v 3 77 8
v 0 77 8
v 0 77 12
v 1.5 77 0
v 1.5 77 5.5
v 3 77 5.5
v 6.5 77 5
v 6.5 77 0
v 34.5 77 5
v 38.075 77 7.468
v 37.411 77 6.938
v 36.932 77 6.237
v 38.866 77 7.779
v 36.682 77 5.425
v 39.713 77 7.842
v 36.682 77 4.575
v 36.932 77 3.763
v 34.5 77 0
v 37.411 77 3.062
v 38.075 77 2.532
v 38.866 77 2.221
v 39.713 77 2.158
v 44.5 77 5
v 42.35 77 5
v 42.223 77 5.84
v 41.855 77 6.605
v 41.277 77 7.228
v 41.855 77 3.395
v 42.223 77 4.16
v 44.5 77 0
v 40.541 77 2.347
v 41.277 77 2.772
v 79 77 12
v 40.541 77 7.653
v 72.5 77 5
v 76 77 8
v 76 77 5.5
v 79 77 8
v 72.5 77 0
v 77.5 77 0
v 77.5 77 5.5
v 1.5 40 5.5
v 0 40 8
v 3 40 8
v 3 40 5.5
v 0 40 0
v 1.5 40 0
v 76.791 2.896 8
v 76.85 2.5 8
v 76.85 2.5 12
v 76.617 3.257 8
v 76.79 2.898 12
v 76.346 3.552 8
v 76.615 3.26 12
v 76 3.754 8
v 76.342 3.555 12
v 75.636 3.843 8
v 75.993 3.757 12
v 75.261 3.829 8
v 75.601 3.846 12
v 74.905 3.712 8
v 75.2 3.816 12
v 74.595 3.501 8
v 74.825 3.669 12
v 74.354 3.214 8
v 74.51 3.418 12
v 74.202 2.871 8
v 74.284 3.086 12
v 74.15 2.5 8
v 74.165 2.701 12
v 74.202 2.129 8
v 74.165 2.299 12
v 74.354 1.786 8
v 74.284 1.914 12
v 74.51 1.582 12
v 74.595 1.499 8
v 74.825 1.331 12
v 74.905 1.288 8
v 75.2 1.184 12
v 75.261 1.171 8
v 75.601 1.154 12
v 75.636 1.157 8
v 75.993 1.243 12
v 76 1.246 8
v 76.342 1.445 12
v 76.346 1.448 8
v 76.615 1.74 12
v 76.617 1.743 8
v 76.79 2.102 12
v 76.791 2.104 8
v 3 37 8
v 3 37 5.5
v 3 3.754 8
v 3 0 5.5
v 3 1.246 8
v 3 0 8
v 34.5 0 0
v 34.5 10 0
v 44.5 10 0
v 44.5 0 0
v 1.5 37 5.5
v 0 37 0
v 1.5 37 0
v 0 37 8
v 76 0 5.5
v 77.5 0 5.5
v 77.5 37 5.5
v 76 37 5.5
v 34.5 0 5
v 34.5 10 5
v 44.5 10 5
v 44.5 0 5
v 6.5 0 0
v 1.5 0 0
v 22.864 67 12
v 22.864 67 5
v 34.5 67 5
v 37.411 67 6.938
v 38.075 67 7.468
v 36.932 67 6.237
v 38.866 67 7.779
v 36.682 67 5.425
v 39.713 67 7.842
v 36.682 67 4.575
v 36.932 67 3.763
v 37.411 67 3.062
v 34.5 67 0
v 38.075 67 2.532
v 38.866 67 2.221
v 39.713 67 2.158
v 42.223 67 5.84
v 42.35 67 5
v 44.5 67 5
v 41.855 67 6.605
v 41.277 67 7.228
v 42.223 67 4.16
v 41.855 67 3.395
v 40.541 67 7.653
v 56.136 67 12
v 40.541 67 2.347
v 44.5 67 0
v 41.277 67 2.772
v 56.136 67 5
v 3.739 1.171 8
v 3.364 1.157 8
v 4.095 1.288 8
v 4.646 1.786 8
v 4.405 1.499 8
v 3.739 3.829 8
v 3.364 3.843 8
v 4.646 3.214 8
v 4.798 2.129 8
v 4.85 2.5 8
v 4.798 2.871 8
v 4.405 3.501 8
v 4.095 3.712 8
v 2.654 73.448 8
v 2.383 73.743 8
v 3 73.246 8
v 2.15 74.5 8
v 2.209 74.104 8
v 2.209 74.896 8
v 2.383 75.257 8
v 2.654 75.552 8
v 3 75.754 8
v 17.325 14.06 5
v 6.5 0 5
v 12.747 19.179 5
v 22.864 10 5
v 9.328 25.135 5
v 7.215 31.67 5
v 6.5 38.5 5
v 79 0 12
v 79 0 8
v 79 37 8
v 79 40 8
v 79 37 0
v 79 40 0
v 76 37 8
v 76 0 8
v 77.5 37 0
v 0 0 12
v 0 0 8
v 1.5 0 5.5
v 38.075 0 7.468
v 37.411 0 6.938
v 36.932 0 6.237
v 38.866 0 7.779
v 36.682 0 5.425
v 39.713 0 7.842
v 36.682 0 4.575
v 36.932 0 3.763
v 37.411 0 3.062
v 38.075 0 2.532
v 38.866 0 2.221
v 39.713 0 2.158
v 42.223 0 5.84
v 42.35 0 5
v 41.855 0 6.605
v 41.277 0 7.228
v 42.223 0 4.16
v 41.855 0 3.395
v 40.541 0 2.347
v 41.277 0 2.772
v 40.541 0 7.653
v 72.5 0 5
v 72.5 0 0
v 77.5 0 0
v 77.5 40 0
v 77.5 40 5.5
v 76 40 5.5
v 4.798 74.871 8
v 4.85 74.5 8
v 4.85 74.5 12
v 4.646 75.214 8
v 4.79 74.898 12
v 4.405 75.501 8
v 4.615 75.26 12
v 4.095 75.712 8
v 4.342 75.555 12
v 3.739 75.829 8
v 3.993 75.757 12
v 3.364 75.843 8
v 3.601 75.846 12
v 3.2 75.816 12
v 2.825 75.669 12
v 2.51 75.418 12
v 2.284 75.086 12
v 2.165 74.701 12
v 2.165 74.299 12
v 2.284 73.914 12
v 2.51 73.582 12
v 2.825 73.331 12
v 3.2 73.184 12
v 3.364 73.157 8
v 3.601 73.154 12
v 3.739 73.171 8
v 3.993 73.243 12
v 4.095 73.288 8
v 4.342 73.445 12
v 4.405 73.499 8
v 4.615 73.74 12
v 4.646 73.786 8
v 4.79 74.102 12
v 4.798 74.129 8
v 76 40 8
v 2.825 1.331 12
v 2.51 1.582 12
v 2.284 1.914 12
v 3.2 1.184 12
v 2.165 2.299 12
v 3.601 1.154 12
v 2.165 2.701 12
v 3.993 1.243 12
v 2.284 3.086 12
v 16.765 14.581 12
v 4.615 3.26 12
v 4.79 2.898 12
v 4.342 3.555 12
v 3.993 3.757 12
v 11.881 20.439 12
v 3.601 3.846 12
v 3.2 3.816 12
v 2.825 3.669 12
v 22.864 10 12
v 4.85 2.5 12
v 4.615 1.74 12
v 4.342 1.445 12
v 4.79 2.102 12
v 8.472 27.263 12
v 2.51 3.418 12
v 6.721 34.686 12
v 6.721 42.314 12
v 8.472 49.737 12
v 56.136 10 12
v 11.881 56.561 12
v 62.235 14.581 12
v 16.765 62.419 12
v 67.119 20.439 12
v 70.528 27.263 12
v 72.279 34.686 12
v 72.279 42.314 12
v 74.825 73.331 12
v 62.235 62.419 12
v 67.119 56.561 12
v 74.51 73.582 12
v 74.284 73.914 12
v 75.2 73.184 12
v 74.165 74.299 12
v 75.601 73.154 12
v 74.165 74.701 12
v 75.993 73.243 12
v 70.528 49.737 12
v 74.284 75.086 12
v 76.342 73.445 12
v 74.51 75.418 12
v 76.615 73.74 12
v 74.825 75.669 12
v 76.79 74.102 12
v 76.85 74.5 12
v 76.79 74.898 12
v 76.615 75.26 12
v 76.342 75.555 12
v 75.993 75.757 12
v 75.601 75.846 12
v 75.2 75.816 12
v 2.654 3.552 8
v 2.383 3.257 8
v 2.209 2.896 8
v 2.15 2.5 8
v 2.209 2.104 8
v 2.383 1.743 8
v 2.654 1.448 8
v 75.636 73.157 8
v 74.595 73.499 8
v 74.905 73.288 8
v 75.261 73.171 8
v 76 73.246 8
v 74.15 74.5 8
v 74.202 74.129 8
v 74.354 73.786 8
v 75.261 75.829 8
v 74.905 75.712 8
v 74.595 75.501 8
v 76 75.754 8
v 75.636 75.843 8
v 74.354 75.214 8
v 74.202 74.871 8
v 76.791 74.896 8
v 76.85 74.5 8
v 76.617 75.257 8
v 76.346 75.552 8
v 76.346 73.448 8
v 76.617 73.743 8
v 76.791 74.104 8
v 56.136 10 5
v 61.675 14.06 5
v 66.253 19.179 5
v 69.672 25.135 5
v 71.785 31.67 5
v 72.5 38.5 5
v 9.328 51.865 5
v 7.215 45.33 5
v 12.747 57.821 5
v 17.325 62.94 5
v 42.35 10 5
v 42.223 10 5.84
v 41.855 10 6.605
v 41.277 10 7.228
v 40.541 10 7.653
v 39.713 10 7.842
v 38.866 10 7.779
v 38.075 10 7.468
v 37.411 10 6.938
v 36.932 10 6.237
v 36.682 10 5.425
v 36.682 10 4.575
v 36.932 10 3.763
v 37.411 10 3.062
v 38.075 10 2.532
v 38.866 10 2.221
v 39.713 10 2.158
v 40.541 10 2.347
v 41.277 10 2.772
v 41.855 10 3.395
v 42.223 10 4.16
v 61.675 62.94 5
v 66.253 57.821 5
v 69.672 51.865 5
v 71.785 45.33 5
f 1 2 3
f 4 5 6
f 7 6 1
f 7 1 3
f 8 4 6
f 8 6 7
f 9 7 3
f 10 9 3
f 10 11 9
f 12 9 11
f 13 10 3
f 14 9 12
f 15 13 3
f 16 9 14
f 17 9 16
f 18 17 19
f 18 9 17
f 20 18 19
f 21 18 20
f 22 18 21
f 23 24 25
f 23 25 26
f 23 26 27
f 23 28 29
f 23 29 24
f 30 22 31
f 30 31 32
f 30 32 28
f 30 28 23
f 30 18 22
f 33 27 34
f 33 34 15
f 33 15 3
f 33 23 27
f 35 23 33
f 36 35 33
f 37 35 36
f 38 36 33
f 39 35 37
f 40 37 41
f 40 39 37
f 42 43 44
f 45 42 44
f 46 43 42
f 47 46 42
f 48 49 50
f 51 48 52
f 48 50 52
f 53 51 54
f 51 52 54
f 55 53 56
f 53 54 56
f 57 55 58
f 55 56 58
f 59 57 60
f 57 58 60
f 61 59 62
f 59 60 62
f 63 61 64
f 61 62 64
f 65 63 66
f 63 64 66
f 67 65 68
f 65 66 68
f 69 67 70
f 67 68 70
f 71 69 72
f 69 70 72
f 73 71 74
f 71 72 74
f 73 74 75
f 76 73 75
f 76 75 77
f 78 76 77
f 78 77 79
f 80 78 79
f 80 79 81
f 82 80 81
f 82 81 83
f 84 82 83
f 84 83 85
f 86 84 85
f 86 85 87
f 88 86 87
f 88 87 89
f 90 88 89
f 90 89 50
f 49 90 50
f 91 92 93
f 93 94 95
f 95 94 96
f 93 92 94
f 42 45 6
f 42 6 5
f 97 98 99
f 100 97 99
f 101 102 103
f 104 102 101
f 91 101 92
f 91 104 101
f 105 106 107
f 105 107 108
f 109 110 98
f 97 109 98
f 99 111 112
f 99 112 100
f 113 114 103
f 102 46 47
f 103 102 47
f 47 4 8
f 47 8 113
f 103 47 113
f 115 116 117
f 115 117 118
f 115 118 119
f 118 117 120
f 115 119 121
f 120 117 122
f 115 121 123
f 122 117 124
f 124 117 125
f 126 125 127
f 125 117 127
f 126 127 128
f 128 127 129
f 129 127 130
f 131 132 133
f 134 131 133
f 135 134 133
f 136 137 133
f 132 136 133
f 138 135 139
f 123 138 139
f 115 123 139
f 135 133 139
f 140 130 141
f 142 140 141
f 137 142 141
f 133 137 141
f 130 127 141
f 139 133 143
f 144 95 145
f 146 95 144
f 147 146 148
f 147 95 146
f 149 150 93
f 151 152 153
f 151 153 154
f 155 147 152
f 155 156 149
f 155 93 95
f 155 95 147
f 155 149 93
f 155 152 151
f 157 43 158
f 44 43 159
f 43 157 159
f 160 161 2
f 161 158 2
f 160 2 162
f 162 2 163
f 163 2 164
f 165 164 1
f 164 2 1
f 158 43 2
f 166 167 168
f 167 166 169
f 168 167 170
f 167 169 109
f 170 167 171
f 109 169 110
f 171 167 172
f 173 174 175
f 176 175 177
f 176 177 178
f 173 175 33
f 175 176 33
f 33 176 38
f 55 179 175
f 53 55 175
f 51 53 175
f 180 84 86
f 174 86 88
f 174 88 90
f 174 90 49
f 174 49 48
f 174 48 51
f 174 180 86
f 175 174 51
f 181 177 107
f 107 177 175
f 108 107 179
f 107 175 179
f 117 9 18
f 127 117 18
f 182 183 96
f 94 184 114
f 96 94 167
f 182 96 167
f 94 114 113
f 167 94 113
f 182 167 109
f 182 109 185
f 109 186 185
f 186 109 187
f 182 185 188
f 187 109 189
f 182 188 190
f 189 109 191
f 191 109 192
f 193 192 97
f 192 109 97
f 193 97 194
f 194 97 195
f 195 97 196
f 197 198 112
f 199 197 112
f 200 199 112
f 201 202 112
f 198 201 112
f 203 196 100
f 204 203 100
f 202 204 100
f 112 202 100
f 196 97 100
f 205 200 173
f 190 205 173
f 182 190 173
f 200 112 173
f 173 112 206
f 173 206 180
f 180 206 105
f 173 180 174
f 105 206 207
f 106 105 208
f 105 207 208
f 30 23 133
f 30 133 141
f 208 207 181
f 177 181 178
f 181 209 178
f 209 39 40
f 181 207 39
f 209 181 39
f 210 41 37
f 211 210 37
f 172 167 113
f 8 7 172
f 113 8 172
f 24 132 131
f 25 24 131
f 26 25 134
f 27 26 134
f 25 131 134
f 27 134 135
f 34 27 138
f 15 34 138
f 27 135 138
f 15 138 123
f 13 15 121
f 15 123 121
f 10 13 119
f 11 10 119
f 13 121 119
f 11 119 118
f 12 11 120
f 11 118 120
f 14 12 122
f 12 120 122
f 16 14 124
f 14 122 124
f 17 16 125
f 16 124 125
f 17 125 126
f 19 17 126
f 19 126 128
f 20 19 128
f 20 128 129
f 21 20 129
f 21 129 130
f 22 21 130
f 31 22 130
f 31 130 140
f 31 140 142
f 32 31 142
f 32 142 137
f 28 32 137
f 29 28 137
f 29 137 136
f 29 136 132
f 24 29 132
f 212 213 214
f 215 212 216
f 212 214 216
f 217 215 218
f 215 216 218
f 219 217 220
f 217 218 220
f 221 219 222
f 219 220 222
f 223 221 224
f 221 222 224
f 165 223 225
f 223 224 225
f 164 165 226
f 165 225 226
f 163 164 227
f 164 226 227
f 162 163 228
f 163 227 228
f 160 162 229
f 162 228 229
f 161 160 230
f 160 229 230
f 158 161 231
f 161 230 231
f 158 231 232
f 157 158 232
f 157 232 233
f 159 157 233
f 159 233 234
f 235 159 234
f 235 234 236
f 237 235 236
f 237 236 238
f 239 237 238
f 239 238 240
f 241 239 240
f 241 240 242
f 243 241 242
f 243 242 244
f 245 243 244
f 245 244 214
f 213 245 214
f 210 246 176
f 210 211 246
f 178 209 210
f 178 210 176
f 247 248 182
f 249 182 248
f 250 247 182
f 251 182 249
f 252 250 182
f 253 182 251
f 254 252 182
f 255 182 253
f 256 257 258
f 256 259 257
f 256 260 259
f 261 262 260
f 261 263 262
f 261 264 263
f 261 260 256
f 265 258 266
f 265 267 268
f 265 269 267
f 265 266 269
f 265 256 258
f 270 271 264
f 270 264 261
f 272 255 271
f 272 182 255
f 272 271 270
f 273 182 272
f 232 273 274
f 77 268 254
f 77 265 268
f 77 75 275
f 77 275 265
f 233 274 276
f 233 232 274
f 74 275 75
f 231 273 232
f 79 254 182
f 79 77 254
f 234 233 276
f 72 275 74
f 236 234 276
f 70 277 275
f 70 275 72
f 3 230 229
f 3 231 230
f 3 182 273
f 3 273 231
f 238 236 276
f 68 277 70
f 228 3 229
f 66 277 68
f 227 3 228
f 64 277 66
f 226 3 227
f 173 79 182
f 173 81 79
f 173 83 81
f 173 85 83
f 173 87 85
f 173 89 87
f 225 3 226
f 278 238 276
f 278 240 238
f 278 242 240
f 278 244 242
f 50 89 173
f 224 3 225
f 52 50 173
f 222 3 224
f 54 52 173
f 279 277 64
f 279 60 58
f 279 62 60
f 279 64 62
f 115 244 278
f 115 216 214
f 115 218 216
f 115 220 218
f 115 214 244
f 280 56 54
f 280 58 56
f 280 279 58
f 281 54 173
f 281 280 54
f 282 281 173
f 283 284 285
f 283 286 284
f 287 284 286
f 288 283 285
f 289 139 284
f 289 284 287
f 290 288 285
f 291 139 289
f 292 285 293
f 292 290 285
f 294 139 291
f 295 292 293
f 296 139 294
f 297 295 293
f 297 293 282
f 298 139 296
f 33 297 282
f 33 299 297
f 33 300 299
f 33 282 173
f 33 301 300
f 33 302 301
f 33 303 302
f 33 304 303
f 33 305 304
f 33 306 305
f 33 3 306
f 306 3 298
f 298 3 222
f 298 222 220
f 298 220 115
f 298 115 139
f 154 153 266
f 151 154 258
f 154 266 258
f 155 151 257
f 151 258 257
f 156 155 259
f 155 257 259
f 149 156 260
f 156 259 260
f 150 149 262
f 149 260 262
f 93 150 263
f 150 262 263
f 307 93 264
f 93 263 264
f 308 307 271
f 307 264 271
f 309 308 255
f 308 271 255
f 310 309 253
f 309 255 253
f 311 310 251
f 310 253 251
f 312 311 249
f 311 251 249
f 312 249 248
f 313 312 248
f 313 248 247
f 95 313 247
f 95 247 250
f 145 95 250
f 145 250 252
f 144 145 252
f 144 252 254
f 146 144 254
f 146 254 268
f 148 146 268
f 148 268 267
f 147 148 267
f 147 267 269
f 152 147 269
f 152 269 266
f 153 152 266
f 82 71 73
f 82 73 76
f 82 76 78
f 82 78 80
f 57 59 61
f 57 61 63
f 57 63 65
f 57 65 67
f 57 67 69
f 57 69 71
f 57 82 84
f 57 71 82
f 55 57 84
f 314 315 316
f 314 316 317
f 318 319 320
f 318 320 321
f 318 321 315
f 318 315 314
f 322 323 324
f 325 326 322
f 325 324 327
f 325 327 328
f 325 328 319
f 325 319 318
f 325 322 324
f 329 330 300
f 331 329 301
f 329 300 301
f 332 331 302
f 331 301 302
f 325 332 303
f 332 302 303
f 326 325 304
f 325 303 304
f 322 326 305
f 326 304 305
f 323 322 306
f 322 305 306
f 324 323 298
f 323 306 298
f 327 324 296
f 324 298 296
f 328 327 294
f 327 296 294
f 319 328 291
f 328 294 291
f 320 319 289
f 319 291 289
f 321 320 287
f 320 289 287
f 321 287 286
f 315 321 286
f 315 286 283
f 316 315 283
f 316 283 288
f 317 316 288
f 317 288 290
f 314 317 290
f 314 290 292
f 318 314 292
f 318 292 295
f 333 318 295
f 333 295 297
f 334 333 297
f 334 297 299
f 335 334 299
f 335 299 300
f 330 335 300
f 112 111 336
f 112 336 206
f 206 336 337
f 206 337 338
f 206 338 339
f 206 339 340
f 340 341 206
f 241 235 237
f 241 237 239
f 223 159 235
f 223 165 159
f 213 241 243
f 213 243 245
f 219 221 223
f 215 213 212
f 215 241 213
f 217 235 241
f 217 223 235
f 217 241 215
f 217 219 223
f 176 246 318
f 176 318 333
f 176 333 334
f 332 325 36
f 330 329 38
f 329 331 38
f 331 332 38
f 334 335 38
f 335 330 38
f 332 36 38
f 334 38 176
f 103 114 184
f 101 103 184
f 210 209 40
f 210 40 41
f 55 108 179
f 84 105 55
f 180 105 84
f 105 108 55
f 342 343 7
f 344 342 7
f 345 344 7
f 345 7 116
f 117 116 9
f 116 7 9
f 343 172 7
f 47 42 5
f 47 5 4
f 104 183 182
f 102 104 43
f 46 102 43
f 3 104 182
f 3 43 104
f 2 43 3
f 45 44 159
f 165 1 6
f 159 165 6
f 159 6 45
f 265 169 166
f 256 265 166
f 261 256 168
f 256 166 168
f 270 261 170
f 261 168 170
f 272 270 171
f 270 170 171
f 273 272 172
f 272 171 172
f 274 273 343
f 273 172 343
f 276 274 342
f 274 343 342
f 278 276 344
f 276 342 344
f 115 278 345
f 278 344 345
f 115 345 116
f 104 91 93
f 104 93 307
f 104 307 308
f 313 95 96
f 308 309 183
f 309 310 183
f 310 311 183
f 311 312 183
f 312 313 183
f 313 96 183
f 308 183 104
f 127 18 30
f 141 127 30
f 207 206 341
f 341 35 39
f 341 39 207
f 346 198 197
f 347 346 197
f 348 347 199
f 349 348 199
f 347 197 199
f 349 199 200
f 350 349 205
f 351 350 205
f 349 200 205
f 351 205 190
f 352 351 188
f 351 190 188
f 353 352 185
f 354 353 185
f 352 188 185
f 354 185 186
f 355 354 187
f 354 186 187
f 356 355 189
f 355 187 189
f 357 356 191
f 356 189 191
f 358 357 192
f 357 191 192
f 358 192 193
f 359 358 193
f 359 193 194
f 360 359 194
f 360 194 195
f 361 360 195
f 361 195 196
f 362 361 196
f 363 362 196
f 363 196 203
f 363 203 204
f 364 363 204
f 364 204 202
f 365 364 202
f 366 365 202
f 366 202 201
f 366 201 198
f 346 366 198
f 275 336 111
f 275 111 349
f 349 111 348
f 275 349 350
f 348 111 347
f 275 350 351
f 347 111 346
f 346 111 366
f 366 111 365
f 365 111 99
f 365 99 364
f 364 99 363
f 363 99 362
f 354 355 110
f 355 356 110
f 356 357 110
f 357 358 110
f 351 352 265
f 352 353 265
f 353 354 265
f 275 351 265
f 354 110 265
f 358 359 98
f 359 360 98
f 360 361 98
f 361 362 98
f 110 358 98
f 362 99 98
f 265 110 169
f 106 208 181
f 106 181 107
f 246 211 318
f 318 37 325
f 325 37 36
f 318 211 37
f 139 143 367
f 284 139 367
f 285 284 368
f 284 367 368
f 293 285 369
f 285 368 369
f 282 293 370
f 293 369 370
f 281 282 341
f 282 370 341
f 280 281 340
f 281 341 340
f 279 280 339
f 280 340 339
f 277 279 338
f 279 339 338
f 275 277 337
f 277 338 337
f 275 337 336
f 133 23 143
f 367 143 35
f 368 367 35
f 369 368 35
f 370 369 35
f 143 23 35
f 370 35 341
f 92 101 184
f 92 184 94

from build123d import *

# Parameters (mm, degrees)
SKETCH1_W           = 79
SKETCH1_H           = 77
BOSS_EXTRUDE1_DEPTH = 12
CUT_EXTRUDE1_DEPTH  = 37
CUT_EXTRUDE2_DEPTH  = 37
SKETCH5_W           = 28
SKETCH5_H           = 5
CUT_EXTRUDE3_DEPTH  = 77
SKETCH7_R           = 2.85
CUT_EXTRUDE5_DEPTH  = 77
SKETCH8_R           = 1.35
CUT_EXTRUDE6_DEPTH  = 4


with BuildPart() as part:
    # Sketch1 → Boss-Extrude1 (new body)
    with BuildSketch(Plane.XY):
        with Locations((39.5, 38.5)):
            Rectangle(SKETCH1_W, SKETCH1_H)
        with BuildLine():
            Line((22.86419524, 67), (56.13580476, 67))
            ThreePointArc((56.13580476, 67), (72.5, 38.5), (56.13580476, 10))
            Line((56.13580476, 10), (22.86419524, 10))
            ThreePointArc((22.86419524, 10), (6.5, 38.5), (22.86419524, 67))
        make_face(mode=Mode.SUBTRACT)
    extrude(amount=BOSS_EXTRUDE1_DEPTH)

    # Sketch3 → Cut-Extrude1 (cut)
    with BuildSketch(Plane.XZ):
        Polygon((0, 0), (1.5, 0), (1.5, 5.5), (3, 5.5), (3, 8), (0, 8), align=None)
        Polygon((79, 0), (77.5, 0), (77.5, 5.5), (76, 5.5), (76, 8), (79, 8), align=None)
    extrude(amount=-CUT_EXTRUDE1_DEPTH, mode=Mode.SUBTRACT)

    # Sketch4 → Cut-Extrude2 (cut)
    with BuildSketch(Plane(origin=(0, 77, 0), x_dir=(1, 0, 0), z_dir=(0, 1, 0))):
        Polygon((76, -8), (79, -8), (79, 0), (77.5, 0), (77.5, -5.5), (76, -5.5), align=None)
        Polygon((0, -8), (3, -8), (3, -5.5), (1.5, -5.5), (1.5, 0), (0, 0), align=None)
    extrude(amount=-CUT_EXTRUDE2_DEPTH, mode=Mode.SUBTRACT)

    # Sketch5 → Cut-Extrude3 (cut)
    with BuildSketch(Plane(origin=(0, 77, 0), x_dir=(1, 0, 0), z_dir=(0, 1, 0))):
        with Locations((58.5, -2.5)):
            Rectangle(SKETCH5_W, SKETCH5_H)
        with Locations((20.5, -2.5)):
            Rectangle(SKETCH5_W, SKETCH5_H)
    extrude(amount=-CUT_EXTRUDE3_DEPTH, mode=Mode.SUBTRACT)

    # Sketch7 → Cut-Extrude5 (cut)
    with BuildSketch(Plane.XZ):
        with Locations((39.5, 5)):
            Circle(SKETCH7_R)
    extrude(amount=-CUT_EXTRUDE5_DEPTH, mode=Mode.SUBTRACT)

    # Sketch8 → Cut-Extrude6 (cut)
    with BuildSketch(Plane.XY.offset(12)):
        with Locations((75.5, 2.5)):
            Circle(SKETCH8_R)
        with Locations((75.5, 74.5)):
            Circle(SKETCH8_R)
        with Locations((3.5, 74.5)):
            Circle(SKETCH8_R)
        with Locations((3.5, 2.5)):
            Circle(SKETCH8_R)
    extrude(amount=-CUT_EXTRUDE6_DEPTH, mode=Mode.SUBTRACT)


solid = part.part
